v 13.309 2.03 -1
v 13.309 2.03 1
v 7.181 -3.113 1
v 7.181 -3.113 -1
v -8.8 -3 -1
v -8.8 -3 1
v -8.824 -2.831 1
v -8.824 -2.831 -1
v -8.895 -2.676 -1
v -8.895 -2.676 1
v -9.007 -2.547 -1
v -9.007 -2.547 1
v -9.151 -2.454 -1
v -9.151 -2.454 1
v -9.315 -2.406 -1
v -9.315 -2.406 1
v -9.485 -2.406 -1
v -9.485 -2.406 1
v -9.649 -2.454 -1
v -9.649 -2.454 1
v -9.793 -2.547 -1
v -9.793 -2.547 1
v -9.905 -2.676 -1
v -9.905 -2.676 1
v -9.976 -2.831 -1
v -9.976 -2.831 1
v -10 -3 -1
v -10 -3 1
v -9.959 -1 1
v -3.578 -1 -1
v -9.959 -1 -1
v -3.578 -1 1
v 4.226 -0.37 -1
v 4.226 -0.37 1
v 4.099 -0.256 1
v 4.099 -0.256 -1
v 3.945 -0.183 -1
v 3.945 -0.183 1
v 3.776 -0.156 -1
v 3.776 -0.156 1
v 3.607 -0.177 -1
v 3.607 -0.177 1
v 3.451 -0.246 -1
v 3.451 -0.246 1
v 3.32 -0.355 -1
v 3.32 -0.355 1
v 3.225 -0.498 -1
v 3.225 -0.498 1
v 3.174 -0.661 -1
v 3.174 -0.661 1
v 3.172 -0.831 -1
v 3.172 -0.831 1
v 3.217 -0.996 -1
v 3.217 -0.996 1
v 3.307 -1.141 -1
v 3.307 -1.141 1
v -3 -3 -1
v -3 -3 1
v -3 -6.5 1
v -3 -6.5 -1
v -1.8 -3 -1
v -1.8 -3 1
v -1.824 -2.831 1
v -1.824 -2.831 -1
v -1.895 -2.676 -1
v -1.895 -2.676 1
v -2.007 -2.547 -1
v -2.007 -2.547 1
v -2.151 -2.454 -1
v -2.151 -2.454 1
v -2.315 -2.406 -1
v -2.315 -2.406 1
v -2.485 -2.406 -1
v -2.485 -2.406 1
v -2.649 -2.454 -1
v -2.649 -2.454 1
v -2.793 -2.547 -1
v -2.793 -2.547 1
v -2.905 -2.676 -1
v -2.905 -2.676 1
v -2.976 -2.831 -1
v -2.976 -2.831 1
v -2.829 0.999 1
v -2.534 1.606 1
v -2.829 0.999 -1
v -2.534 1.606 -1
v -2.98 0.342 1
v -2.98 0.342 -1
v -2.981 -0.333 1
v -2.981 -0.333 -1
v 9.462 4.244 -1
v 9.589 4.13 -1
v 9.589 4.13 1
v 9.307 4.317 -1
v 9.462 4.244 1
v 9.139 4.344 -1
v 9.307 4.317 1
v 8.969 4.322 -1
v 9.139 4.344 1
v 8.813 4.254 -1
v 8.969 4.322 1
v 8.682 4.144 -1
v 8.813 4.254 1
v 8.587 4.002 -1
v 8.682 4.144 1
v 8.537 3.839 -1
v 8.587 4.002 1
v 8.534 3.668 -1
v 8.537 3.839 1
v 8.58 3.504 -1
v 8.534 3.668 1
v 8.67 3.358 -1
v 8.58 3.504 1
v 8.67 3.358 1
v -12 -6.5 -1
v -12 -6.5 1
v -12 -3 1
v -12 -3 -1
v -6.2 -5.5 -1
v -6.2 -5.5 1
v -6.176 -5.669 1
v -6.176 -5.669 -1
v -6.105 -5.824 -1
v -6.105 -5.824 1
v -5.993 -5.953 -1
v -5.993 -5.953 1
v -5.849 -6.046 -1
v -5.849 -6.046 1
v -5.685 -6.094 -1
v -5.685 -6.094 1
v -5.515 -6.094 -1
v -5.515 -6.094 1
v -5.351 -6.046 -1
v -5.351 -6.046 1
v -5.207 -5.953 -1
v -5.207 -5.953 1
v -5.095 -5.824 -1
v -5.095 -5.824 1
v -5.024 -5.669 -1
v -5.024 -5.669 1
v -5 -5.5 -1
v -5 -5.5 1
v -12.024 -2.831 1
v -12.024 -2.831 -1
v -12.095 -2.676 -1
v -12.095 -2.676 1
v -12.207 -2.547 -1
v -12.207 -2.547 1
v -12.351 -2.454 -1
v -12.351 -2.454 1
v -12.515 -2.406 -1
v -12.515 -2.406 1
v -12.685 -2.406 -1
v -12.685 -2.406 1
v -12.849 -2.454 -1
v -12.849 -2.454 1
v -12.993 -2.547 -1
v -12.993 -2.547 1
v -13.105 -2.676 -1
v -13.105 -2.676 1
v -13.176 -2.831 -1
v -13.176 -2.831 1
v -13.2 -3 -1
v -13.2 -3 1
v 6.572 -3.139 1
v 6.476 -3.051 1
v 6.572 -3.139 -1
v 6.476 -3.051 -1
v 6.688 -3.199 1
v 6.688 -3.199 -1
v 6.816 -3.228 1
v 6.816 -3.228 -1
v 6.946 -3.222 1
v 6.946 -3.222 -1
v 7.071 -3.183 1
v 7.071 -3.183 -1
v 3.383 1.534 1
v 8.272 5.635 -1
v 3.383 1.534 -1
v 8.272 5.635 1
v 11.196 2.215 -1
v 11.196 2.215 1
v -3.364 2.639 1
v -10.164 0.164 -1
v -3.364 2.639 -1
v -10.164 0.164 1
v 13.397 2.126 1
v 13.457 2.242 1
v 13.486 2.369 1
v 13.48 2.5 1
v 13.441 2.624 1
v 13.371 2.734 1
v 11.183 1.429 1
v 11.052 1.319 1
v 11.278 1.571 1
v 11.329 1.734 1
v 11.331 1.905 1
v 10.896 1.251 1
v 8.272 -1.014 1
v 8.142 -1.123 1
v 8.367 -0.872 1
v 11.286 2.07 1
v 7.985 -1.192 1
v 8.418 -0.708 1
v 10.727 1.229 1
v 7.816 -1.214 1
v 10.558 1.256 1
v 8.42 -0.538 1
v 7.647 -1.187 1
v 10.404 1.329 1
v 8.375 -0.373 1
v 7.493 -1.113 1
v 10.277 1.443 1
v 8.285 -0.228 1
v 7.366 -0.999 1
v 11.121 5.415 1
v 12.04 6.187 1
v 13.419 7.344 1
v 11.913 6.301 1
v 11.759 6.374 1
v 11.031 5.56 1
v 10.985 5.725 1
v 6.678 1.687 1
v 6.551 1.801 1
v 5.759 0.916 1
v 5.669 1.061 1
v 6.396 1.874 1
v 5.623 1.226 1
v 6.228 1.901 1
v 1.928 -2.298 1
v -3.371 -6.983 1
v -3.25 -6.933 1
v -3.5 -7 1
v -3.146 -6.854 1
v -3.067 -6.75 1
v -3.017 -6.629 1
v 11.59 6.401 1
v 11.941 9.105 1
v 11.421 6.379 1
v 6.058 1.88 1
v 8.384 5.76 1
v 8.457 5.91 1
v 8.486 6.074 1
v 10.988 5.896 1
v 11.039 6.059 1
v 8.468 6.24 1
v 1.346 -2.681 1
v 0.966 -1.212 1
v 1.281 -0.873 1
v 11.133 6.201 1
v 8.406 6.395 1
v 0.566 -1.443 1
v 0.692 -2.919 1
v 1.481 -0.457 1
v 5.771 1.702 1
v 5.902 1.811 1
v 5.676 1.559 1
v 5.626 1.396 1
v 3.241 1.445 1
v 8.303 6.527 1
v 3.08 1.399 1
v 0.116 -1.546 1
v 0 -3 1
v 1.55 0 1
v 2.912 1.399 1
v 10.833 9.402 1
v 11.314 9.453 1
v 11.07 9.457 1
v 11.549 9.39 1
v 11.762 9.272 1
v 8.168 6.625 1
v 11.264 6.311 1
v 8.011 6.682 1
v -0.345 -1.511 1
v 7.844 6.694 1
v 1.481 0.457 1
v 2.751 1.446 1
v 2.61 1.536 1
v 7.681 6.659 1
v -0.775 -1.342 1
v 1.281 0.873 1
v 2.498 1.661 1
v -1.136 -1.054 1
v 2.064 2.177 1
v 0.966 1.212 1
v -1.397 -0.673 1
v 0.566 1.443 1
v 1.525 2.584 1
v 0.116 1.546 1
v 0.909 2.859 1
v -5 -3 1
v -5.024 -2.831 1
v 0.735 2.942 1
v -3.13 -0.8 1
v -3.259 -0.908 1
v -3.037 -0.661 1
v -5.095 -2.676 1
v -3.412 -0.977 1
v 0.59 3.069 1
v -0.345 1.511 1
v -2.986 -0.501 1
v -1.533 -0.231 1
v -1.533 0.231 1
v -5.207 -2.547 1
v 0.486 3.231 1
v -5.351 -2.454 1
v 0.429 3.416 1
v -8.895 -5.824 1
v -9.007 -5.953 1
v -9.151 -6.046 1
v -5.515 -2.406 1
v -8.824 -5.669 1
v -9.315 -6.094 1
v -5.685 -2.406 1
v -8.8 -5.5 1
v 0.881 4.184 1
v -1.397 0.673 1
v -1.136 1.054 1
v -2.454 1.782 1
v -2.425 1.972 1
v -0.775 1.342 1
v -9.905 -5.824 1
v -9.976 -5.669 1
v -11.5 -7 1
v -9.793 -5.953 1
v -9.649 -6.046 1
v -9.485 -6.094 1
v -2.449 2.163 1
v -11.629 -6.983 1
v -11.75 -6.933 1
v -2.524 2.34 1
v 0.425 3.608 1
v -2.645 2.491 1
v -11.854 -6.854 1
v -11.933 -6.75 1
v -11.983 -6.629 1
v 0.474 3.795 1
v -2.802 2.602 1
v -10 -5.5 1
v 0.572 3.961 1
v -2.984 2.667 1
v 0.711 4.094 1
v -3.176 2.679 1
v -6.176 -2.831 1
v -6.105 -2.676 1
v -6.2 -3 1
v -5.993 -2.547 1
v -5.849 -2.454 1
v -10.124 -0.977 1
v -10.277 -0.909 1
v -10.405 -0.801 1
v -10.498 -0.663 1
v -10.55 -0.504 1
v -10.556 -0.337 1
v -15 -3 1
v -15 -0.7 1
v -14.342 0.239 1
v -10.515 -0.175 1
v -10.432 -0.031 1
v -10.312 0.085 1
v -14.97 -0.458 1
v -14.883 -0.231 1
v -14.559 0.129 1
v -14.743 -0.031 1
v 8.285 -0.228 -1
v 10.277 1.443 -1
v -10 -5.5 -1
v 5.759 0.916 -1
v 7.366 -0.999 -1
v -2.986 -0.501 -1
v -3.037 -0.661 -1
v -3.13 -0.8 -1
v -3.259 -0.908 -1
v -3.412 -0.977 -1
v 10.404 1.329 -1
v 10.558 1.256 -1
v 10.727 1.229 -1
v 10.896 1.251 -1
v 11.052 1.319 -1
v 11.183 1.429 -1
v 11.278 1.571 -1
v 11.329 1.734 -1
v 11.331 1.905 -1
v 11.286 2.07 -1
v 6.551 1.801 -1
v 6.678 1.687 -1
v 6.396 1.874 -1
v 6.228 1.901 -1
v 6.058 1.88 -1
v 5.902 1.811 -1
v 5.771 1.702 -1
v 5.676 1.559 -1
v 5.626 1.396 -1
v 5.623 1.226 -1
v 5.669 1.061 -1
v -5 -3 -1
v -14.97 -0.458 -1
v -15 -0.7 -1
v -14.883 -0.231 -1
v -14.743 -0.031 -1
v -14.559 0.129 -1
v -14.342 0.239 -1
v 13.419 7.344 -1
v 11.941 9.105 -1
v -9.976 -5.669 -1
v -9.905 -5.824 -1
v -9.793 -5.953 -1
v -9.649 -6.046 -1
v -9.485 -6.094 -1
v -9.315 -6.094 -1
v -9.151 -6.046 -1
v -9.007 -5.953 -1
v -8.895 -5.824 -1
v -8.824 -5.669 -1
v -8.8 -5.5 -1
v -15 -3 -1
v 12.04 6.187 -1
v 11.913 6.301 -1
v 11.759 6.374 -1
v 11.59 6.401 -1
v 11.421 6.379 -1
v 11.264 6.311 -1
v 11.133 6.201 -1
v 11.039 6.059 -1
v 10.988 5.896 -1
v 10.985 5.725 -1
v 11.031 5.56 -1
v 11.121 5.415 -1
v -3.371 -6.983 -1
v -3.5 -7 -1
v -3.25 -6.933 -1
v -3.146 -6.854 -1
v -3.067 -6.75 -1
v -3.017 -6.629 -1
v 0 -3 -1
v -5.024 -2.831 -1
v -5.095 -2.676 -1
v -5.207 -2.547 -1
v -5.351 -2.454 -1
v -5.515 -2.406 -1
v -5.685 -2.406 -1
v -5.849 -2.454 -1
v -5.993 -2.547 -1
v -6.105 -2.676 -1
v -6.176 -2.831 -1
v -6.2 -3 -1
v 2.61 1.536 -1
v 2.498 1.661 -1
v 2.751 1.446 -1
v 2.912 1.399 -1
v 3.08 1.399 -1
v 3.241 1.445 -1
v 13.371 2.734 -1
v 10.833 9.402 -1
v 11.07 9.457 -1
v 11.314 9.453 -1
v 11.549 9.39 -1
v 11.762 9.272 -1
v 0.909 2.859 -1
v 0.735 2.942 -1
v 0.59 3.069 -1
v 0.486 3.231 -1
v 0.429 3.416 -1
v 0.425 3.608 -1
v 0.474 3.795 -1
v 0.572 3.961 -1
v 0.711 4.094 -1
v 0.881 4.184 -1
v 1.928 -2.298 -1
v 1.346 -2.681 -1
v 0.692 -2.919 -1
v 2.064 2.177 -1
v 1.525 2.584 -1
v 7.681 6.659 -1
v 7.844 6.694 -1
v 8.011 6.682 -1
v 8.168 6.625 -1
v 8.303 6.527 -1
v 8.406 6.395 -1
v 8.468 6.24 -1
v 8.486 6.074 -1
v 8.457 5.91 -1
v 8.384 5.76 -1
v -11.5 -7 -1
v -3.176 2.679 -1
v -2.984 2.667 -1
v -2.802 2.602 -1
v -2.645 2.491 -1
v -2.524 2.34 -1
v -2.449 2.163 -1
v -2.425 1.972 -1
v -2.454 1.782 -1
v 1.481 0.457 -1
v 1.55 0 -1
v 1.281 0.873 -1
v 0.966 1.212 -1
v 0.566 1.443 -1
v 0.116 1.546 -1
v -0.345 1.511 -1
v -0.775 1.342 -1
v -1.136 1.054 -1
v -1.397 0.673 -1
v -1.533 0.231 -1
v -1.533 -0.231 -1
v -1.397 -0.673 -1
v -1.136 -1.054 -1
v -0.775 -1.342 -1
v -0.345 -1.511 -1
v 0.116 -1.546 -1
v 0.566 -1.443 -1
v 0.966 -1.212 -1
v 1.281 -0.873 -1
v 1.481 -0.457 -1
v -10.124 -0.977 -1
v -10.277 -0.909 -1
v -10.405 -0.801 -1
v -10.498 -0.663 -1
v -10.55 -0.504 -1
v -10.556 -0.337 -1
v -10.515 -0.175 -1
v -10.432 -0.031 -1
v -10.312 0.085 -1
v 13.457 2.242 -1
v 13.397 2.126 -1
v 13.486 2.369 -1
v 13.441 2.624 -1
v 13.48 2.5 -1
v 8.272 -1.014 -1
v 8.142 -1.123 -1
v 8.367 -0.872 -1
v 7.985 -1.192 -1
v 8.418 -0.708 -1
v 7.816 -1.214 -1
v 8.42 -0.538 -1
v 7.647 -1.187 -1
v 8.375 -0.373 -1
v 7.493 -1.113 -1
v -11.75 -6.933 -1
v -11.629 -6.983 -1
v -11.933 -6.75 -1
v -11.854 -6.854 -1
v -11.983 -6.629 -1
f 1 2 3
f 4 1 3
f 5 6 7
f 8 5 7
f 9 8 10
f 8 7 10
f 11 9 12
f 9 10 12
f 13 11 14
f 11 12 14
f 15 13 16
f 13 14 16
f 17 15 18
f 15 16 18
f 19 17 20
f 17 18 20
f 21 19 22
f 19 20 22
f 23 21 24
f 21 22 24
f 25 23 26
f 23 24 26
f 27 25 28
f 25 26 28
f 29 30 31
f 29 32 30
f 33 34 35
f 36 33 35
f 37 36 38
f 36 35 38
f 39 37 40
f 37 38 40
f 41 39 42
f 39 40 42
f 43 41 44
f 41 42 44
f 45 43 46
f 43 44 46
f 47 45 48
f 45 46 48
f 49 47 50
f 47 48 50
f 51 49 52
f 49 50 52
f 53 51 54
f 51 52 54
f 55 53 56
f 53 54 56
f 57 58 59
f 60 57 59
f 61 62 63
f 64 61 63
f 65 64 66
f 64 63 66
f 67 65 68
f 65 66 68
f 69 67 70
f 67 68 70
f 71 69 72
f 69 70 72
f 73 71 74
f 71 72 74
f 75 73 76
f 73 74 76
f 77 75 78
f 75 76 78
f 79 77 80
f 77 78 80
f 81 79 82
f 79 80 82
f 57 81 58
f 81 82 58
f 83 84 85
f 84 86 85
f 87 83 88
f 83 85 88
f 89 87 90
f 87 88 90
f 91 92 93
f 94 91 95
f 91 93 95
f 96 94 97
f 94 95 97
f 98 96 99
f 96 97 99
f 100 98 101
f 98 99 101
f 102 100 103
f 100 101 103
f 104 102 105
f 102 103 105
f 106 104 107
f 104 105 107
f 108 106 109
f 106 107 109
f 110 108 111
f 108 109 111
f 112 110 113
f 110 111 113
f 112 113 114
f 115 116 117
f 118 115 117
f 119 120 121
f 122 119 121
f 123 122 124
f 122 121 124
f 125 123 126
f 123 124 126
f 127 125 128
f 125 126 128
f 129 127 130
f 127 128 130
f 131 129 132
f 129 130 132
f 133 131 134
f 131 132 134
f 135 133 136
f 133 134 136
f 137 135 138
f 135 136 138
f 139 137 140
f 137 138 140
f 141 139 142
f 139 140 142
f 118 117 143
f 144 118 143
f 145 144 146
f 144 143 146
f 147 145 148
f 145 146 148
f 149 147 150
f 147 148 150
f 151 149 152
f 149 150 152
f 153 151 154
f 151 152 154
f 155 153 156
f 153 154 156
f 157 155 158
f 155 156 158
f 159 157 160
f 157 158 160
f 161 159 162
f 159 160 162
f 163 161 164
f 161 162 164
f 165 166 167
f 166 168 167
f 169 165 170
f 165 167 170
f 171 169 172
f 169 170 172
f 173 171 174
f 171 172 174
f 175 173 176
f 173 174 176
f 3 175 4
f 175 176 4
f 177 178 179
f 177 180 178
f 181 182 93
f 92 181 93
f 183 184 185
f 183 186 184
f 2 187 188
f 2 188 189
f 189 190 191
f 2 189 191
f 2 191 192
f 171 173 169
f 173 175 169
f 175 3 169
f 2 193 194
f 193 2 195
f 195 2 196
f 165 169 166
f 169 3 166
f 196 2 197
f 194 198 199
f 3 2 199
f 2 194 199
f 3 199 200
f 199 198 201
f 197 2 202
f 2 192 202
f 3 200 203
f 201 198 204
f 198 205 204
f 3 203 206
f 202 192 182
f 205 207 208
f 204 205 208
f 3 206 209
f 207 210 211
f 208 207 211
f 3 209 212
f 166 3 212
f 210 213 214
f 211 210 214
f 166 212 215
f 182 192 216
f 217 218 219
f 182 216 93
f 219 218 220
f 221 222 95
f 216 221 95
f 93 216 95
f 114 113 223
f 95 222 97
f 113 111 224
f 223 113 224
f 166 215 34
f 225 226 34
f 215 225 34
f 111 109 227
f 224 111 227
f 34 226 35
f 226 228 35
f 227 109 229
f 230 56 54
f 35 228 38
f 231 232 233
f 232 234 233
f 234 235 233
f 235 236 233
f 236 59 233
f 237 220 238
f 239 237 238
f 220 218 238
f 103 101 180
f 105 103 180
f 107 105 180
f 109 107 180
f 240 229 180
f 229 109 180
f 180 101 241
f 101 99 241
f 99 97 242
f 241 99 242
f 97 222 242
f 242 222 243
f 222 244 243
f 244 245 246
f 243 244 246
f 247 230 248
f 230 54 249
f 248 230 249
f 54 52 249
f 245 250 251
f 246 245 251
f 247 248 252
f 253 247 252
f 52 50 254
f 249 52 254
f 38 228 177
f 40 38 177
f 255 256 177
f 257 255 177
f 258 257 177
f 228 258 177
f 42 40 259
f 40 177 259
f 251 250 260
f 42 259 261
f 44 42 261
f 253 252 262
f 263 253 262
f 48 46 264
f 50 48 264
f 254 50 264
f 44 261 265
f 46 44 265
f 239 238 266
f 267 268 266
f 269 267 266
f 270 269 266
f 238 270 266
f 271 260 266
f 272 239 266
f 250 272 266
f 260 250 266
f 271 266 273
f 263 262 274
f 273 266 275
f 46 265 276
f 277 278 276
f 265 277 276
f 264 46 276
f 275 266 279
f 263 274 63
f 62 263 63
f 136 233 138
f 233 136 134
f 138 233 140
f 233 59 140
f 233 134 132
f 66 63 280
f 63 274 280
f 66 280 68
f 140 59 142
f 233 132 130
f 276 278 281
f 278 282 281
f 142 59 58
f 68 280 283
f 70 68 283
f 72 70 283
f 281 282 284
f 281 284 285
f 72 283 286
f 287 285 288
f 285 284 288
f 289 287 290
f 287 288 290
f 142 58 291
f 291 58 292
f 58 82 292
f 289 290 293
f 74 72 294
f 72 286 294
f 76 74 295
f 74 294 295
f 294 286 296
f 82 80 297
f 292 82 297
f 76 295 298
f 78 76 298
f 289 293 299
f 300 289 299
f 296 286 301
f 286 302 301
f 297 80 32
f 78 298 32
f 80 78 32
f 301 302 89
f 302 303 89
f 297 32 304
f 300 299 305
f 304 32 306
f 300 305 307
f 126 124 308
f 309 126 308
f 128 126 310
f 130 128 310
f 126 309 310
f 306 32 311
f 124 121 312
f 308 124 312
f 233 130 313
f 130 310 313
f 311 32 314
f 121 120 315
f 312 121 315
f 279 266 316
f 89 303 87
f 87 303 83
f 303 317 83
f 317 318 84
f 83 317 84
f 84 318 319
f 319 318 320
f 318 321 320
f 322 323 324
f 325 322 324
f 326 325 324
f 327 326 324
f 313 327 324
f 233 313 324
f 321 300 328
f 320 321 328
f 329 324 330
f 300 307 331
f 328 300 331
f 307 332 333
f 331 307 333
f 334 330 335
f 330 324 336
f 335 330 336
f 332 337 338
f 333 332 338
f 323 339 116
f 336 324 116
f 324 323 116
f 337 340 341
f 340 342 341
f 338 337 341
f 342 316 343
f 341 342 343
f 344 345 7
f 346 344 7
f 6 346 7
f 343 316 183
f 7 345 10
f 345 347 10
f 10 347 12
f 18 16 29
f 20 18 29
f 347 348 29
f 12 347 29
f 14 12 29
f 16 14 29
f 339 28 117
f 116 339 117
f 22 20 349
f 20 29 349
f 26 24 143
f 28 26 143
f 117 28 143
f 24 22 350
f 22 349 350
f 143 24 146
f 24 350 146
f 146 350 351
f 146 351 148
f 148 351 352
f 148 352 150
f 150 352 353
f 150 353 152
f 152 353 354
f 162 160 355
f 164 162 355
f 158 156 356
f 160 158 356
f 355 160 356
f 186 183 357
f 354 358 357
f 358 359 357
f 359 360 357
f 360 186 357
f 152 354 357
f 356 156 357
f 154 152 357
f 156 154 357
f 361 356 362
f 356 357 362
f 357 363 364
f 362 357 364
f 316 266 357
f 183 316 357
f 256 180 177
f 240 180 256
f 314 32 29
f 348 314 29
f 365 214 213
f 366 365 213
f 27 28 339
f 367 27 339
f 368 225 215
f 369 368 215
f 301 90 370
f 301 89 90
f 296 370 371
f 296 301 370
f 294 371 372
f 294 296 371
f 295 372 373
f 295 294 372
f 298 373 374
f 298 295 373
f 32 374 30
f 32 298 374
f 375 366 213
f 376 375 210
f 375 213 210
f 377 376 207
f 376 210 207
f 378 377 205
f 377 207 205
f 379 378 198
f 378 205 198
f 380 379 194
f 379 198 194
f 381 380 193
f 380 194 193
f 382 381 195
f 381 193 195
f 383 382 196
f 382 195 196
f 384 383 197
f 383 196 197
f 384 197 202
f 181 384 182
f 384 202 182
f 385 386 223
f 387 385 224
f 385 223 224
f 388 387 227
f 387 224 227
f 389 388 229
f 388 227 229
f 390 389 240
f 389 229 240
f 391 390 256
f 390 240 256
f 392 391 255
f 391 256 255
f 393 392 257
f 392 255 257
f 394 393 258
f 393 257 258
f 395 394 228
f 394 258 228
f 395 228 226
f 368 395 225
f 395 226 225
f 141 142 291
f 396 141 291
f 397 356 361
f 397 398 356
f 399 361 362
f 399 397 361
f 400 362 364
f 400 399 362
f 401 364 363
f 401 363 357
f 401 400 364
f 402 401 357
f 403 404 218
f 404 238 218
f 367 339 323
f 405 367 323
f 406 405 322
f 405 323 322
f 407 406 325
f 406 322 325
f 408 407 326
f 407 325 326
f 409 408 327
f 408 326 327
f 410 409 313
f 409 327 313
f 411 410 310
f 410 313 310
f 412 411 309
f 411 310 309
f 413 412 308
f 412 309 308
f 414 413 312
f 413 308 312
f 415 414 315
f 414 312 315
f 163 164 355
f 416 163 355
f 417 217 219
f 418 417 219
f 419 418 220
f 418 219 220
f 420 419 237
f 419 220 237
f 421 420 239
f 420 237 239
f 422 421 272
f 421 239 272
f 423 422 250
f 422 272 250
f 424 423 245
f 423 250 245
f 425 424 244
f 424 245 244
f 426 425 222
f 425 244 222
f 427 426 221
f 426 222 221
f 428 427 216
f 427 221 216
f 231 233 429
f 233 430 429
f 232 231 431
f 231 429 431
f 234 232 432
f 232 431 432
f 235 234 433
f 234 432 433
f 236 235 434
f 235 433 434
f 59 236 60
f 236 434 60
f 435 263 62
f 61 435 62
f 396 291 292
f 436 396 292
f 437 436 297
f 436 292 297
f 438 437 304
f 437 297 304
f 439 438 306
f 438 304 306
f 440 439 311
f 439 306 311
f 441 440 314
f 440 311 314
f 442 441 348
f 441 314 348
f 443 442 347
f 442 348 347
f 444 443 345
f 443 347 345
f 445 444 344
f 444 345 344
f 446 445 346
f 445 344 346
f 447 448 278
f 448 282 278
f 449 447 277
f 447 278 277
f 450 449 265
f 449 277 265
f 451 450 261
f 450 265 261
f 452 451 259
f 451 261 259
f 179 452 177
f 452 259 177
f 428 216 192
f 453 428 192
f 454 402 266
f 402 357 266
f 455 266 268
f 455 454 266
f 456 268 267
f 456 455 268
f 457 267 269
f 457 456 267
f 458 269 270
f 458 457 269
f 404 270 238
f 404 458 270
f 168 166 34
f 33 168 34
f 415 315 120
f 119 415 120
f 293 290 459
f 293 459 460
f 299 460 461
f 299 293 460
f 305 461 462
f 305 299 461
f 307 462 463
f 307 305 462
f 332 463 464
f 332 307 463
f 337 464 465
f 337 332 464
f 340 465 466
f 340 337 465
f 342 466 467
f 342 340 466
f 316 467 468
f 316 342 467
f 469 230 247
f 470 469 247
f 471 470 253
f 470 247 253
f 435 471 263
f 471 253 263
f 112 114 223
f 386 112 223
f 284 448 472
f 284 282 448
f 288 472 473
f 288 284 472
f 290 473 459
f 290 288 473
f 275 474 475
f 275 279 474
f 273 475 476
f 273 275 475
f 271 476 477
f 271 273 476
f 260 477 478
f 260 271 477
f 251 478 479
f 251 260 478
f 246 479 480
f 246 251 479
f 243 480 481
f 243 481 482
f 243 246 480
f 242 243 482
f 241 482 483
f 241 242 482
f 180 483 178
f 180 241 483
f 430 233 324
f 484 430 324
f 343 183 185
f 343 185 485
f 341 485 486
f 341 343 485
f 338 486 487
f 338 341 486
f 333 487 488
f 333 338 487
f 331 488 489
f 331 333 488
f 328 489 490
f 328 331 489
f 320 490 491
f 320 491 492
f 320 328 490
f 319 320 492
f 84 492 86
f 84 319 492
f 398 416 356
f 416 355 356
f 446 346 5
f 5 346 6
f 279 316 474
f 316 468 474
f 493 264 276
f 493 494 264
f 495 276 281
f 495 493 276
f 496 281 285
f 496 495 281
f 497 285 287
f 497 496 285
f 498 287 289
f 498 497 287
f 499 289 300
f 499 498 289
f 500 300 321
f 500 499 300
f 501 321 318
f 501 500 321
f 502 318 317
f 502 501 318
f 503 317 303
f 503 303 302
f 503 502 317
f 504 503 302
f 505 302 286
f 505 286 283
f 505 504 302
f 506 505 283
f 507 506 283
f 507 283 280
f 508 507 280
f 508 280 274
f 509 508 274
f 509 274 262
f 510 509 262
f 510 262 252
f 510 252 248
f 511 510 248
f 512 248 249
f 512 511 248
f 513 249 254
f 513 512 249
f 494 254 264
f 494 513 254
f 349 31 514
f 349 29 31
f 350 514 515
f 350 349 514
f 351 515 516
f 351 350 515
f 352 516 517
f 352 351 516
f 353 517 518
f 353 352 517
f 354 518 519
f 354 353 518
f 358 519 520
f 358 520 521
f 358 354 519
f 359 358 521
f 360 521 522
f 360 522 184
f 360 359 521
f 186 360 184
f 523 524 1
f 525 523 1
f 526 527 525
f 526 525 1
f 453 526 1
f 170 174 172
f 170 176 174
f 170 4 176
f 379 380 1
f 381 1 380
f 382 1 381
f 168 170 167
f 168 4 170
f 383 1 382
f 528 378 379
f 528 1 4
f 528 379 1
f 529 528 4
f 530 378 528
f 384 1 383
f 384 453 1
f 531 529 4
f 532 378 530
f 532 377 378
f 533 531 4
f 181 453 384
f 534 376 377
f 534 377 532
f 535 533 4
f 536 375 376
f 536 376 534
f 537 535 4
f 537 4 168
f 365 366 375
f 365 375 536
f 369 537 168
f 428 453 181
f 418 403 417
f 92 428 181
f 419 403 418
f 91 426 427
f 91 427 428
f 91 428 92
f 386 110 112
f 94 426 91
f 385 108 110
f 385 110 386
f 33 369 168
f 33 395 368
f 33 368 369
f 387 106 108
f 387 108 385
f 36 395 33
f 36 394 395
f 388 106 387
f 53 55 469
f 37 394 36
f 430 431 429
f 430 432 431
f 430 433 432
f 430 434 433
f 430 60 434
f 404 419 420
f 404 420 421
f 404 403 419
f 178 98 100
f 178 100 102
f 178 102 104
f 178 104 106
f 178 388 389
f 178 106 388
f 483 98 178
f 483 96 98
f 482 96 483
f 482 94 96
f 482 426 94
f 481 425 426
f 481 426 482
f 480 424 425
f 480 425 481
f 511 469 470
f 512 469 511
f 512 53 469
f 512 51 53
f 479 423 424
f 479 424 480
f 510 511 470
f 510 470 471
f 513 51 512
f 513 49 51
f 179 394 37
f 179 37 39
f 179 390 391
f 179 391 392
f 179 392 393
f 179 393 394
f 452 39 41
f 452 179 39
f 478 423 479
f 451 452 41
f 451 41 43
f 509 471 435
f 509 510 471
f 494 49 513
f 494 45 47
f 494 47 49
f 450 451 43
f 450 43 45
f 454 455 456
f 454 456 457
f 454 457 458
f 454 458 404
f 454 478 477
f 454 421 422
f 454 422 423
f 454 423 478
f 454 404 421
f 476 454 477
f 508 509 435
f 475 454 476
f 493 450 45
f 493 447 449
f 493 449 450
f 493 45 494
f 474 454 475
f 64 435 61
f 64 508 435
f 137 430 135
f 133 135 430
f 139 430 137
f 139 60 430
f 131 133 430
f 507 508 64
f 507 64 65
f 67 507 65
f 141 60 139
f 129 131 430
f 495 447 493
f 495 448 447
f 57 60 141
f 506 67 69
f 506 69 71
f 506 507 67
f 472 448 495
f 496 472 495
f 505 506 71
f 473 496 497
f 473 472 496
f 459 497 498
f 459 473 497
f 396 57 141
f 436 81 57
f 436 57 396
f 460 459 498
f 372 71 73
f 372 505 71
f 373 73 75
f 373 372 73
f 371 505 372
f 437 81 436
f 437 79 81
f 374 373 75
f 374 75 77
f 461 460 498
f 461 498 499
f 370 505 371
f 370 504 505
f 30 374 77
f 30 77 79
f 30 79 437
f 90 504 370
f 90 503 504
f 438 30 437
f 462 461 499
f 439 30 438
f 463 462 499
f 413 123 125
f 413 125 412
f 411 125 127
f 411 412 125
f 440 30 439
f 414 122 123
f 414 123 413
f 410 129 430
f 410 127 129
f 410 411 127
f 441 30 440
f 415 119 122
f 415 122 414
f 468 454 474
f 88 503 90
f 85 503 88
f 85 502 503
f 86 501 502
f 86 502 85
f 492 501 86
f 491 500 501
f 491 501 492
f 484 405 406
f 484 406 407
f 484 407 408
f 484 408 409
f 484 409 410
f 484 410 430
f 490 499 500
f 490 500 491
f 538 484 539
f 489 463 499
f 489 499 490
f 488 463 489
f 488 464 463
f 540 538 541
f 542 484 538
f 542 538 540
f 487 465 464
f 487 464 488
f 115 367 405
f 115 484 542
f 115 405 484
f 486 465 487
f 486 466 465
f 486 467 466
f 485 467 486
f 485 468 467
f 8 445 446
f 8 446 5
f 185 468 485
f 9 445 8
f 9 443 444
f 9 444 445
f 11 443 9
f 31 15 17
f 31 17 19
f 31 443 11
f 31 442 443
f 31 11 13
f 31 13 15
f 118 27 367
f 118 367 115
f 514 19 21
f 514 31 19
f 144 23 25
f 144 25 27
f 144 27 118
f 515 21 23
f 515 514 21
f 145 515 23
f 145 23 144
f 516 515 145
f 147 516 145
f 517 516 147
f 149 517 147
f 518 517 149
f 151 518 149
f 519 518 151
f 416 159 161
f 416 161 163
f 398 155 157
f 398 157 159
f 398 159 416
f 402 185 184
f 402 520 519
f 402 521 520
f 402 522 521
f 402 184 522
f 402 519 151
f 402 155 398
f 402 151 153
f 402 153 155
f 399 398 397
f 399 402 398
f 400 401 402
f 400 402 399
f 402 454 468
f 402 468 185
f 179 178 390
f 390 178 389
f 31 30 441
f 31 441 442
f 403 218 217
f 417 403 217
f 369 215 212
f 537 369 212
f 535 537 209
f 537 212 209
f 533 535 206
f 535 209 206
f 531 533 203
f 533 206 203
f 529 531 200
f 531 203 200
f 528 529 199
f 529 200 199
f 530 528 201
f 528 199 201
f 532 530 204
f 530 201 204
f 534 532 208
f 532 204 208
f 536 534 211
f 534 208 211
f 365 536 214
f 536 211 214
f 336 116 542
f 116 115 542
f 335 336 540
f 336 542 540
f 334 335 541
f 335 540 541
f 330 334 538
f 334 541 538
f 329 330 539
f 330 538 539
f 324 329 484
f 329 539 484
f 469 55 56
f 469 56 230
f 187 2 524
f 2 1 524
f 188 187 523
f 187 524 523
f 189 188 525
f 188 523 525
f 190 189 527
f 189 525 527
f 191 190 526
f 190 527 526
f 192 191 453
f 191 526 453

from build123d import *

# Parameters (mm, degrees)
SKETCH_1_R          = 1.55
EXTRUDE_1_DEPTH     = 1
FILLET_1_R          = 0.6
EXTRUDE_2_DEPTH     = 2
SKETCH_3_R          = 0.6
CUT_EXTRUDE_1_DEPTH = 3
FILLET_2_R          = 0.5
FILLET_3_R          = 1


with BuildPart() as part:
    # 草图1 → 凸台-拉伸1 (new body, symmetric)
    with BuildSketch(Plane.XY):
        with BuildLine():
            Line((0, -3), (-15, -3))
            Line((-15, -3), (-15, 0))
            Line((-15, 0), (11.490666647, 9.641814145))
            Line((11.490666647, 9.641814145), (13.419029476, 7.343680816))
            Line((13.419029476, 7.343680816), (1.928362829, -2.298133329))
            ThreePointArc((1.928362829, -2.298133329), (1.02606043, -2.819077862), (0, -3))
        make_face()
        Circle(SKETCH_1_R, mode=Mode.SUBTRACT)
        with BuildLine():
            Line((-13.361770819, -1), (-3.364453737, 2.63872584))
            ThreePointArc((-3.364453737, 2.63872584), (-2.579616657, 2.419704921), (-2.533815922, 1.606168383))
            ThreePointArc((-2.533815922, 1.606168383), (-2.981013424, 0.336985115), (-2.828427125, -1))
            Line((-2.828427125, -1), (-13.361770819, -1))
        make_face(mode=Mode.SUBTRACT)
        with BuildLine():
            Line((10.878497896, 7.822736283), (2.809488491, 1.052033468))
            ThreePointArc((2.809488491, 1.052033468), (2.066978912, 2.174304068), (0.908590471, 2.859101844))
            ThreePointArc((0.908590471, 2.859101844), (0.420744663, 3.511747133), (0.881180814, 4.184010443))
            Line((0.881180814, 4.184010443), (10.878497896, 7.822736283))
        make_face(mode=Mode.SUBTRACT)
    extrude(amount=EXTRUDE_1_DEPTH, both=True)

    # 圆角1
    fillet_1_edges = [part.edges().sort_by_distance(p)[0] for p in [
        (-13.361770819, -1, 0),
        (-2.828427125, -1, 0),
        (10.878497896, 7.822736283, 0),
        (2.809488491, 1.052033468, 0),
    ]]
    fillet(fillet_1_edges, radius=FILLET_1_R)

    # 草图2 → 凸台-拉伸2 (add)
    with BuildSketch(Plane.XY.offset(1)):
        Polygon((-12, -3), (-10, -3), (-10, -5.5), (-5, -5.5), (-5, -3), (-3, -3), (-3, -7), (-12, -7), align=None)
        Polygon((11.120896146, 5.415317987), (13.692046585, 2.351140214), (6.797646597, -3.433948273), (4.226496158, -0.3697705), (5.758585045, 0.915804719), (7.365554069, -0.999306389), (11.195776284, 2.21463166), (9.58880726, 4.129742768), align=None)
    extrude(amount=-EXTRUDE_2_DEPTH)

    # 草图3 → 切除-拉伸1 (cut, through all)
    with BuildSketch(Plane.XY.offset(1)):
        with Locations((-5.6, -3)):
            Circle(SKETCH_3_R)
        with Locations((-5.6, -5.5)):
            Circle(SKETCH_3_R)
        with Locations((-9.4, -3)):
            Circle(SKETCH_3_R)
        with Locations((-9.4, -5.5)):
            Circle(SKETCH_3_R)
        with Locations((6.218211711, 1.301477285)):
            Circle(SKETCH_3_R)
        with Locations((7.825180735, -0.613633823)):
            Circle(SKETCH_3_R)
        with Locations((9.129180594, 3.744070202)):
            Circle(SKETCH_3_R)
        with Locations((10.736149619, 1.828959094)):
            Circle(SKETCH_3_R)
        with Locations((-12.6, -3)):
            Circle(SKETCH_3_R)
        with Locations((-2.4, -3)):
            Circle(SKETCH_3_R)
        with Locations((3.766869493, -0.755443066)):
            Circle(SKETCH_3_R)
        with Locations((11.580522812, 5.800990553)):
            Circle(SKETCH_3_R)
    extrude(amount=-CUT_EXTRUDE_1_DEPTH, mode=Mode.SUBTRACT)

    # 圆角2
    fillet_2_edges = [part.edges().sort_by_distance(p)[0] for p in [
        (13.692046585, 2.351140214, 0),
        (6.797646597, -3.433948273, 0),
        (-12, -7, 0),
        (-3, -7, 0),
    ]]
    fillet(fillet_2_edges, radius=FILLET_2_R)

    # 圆角3
    fillet_3_edges = [part.edges().sort_by_distance(p)[0] for p in [
        (-15, 0, 0),
        (11.490666647, 9.641814145, 0),
    ]]
    fillet(fillet_3_edges, radius=FILLET_3_R)


solid = part.part
